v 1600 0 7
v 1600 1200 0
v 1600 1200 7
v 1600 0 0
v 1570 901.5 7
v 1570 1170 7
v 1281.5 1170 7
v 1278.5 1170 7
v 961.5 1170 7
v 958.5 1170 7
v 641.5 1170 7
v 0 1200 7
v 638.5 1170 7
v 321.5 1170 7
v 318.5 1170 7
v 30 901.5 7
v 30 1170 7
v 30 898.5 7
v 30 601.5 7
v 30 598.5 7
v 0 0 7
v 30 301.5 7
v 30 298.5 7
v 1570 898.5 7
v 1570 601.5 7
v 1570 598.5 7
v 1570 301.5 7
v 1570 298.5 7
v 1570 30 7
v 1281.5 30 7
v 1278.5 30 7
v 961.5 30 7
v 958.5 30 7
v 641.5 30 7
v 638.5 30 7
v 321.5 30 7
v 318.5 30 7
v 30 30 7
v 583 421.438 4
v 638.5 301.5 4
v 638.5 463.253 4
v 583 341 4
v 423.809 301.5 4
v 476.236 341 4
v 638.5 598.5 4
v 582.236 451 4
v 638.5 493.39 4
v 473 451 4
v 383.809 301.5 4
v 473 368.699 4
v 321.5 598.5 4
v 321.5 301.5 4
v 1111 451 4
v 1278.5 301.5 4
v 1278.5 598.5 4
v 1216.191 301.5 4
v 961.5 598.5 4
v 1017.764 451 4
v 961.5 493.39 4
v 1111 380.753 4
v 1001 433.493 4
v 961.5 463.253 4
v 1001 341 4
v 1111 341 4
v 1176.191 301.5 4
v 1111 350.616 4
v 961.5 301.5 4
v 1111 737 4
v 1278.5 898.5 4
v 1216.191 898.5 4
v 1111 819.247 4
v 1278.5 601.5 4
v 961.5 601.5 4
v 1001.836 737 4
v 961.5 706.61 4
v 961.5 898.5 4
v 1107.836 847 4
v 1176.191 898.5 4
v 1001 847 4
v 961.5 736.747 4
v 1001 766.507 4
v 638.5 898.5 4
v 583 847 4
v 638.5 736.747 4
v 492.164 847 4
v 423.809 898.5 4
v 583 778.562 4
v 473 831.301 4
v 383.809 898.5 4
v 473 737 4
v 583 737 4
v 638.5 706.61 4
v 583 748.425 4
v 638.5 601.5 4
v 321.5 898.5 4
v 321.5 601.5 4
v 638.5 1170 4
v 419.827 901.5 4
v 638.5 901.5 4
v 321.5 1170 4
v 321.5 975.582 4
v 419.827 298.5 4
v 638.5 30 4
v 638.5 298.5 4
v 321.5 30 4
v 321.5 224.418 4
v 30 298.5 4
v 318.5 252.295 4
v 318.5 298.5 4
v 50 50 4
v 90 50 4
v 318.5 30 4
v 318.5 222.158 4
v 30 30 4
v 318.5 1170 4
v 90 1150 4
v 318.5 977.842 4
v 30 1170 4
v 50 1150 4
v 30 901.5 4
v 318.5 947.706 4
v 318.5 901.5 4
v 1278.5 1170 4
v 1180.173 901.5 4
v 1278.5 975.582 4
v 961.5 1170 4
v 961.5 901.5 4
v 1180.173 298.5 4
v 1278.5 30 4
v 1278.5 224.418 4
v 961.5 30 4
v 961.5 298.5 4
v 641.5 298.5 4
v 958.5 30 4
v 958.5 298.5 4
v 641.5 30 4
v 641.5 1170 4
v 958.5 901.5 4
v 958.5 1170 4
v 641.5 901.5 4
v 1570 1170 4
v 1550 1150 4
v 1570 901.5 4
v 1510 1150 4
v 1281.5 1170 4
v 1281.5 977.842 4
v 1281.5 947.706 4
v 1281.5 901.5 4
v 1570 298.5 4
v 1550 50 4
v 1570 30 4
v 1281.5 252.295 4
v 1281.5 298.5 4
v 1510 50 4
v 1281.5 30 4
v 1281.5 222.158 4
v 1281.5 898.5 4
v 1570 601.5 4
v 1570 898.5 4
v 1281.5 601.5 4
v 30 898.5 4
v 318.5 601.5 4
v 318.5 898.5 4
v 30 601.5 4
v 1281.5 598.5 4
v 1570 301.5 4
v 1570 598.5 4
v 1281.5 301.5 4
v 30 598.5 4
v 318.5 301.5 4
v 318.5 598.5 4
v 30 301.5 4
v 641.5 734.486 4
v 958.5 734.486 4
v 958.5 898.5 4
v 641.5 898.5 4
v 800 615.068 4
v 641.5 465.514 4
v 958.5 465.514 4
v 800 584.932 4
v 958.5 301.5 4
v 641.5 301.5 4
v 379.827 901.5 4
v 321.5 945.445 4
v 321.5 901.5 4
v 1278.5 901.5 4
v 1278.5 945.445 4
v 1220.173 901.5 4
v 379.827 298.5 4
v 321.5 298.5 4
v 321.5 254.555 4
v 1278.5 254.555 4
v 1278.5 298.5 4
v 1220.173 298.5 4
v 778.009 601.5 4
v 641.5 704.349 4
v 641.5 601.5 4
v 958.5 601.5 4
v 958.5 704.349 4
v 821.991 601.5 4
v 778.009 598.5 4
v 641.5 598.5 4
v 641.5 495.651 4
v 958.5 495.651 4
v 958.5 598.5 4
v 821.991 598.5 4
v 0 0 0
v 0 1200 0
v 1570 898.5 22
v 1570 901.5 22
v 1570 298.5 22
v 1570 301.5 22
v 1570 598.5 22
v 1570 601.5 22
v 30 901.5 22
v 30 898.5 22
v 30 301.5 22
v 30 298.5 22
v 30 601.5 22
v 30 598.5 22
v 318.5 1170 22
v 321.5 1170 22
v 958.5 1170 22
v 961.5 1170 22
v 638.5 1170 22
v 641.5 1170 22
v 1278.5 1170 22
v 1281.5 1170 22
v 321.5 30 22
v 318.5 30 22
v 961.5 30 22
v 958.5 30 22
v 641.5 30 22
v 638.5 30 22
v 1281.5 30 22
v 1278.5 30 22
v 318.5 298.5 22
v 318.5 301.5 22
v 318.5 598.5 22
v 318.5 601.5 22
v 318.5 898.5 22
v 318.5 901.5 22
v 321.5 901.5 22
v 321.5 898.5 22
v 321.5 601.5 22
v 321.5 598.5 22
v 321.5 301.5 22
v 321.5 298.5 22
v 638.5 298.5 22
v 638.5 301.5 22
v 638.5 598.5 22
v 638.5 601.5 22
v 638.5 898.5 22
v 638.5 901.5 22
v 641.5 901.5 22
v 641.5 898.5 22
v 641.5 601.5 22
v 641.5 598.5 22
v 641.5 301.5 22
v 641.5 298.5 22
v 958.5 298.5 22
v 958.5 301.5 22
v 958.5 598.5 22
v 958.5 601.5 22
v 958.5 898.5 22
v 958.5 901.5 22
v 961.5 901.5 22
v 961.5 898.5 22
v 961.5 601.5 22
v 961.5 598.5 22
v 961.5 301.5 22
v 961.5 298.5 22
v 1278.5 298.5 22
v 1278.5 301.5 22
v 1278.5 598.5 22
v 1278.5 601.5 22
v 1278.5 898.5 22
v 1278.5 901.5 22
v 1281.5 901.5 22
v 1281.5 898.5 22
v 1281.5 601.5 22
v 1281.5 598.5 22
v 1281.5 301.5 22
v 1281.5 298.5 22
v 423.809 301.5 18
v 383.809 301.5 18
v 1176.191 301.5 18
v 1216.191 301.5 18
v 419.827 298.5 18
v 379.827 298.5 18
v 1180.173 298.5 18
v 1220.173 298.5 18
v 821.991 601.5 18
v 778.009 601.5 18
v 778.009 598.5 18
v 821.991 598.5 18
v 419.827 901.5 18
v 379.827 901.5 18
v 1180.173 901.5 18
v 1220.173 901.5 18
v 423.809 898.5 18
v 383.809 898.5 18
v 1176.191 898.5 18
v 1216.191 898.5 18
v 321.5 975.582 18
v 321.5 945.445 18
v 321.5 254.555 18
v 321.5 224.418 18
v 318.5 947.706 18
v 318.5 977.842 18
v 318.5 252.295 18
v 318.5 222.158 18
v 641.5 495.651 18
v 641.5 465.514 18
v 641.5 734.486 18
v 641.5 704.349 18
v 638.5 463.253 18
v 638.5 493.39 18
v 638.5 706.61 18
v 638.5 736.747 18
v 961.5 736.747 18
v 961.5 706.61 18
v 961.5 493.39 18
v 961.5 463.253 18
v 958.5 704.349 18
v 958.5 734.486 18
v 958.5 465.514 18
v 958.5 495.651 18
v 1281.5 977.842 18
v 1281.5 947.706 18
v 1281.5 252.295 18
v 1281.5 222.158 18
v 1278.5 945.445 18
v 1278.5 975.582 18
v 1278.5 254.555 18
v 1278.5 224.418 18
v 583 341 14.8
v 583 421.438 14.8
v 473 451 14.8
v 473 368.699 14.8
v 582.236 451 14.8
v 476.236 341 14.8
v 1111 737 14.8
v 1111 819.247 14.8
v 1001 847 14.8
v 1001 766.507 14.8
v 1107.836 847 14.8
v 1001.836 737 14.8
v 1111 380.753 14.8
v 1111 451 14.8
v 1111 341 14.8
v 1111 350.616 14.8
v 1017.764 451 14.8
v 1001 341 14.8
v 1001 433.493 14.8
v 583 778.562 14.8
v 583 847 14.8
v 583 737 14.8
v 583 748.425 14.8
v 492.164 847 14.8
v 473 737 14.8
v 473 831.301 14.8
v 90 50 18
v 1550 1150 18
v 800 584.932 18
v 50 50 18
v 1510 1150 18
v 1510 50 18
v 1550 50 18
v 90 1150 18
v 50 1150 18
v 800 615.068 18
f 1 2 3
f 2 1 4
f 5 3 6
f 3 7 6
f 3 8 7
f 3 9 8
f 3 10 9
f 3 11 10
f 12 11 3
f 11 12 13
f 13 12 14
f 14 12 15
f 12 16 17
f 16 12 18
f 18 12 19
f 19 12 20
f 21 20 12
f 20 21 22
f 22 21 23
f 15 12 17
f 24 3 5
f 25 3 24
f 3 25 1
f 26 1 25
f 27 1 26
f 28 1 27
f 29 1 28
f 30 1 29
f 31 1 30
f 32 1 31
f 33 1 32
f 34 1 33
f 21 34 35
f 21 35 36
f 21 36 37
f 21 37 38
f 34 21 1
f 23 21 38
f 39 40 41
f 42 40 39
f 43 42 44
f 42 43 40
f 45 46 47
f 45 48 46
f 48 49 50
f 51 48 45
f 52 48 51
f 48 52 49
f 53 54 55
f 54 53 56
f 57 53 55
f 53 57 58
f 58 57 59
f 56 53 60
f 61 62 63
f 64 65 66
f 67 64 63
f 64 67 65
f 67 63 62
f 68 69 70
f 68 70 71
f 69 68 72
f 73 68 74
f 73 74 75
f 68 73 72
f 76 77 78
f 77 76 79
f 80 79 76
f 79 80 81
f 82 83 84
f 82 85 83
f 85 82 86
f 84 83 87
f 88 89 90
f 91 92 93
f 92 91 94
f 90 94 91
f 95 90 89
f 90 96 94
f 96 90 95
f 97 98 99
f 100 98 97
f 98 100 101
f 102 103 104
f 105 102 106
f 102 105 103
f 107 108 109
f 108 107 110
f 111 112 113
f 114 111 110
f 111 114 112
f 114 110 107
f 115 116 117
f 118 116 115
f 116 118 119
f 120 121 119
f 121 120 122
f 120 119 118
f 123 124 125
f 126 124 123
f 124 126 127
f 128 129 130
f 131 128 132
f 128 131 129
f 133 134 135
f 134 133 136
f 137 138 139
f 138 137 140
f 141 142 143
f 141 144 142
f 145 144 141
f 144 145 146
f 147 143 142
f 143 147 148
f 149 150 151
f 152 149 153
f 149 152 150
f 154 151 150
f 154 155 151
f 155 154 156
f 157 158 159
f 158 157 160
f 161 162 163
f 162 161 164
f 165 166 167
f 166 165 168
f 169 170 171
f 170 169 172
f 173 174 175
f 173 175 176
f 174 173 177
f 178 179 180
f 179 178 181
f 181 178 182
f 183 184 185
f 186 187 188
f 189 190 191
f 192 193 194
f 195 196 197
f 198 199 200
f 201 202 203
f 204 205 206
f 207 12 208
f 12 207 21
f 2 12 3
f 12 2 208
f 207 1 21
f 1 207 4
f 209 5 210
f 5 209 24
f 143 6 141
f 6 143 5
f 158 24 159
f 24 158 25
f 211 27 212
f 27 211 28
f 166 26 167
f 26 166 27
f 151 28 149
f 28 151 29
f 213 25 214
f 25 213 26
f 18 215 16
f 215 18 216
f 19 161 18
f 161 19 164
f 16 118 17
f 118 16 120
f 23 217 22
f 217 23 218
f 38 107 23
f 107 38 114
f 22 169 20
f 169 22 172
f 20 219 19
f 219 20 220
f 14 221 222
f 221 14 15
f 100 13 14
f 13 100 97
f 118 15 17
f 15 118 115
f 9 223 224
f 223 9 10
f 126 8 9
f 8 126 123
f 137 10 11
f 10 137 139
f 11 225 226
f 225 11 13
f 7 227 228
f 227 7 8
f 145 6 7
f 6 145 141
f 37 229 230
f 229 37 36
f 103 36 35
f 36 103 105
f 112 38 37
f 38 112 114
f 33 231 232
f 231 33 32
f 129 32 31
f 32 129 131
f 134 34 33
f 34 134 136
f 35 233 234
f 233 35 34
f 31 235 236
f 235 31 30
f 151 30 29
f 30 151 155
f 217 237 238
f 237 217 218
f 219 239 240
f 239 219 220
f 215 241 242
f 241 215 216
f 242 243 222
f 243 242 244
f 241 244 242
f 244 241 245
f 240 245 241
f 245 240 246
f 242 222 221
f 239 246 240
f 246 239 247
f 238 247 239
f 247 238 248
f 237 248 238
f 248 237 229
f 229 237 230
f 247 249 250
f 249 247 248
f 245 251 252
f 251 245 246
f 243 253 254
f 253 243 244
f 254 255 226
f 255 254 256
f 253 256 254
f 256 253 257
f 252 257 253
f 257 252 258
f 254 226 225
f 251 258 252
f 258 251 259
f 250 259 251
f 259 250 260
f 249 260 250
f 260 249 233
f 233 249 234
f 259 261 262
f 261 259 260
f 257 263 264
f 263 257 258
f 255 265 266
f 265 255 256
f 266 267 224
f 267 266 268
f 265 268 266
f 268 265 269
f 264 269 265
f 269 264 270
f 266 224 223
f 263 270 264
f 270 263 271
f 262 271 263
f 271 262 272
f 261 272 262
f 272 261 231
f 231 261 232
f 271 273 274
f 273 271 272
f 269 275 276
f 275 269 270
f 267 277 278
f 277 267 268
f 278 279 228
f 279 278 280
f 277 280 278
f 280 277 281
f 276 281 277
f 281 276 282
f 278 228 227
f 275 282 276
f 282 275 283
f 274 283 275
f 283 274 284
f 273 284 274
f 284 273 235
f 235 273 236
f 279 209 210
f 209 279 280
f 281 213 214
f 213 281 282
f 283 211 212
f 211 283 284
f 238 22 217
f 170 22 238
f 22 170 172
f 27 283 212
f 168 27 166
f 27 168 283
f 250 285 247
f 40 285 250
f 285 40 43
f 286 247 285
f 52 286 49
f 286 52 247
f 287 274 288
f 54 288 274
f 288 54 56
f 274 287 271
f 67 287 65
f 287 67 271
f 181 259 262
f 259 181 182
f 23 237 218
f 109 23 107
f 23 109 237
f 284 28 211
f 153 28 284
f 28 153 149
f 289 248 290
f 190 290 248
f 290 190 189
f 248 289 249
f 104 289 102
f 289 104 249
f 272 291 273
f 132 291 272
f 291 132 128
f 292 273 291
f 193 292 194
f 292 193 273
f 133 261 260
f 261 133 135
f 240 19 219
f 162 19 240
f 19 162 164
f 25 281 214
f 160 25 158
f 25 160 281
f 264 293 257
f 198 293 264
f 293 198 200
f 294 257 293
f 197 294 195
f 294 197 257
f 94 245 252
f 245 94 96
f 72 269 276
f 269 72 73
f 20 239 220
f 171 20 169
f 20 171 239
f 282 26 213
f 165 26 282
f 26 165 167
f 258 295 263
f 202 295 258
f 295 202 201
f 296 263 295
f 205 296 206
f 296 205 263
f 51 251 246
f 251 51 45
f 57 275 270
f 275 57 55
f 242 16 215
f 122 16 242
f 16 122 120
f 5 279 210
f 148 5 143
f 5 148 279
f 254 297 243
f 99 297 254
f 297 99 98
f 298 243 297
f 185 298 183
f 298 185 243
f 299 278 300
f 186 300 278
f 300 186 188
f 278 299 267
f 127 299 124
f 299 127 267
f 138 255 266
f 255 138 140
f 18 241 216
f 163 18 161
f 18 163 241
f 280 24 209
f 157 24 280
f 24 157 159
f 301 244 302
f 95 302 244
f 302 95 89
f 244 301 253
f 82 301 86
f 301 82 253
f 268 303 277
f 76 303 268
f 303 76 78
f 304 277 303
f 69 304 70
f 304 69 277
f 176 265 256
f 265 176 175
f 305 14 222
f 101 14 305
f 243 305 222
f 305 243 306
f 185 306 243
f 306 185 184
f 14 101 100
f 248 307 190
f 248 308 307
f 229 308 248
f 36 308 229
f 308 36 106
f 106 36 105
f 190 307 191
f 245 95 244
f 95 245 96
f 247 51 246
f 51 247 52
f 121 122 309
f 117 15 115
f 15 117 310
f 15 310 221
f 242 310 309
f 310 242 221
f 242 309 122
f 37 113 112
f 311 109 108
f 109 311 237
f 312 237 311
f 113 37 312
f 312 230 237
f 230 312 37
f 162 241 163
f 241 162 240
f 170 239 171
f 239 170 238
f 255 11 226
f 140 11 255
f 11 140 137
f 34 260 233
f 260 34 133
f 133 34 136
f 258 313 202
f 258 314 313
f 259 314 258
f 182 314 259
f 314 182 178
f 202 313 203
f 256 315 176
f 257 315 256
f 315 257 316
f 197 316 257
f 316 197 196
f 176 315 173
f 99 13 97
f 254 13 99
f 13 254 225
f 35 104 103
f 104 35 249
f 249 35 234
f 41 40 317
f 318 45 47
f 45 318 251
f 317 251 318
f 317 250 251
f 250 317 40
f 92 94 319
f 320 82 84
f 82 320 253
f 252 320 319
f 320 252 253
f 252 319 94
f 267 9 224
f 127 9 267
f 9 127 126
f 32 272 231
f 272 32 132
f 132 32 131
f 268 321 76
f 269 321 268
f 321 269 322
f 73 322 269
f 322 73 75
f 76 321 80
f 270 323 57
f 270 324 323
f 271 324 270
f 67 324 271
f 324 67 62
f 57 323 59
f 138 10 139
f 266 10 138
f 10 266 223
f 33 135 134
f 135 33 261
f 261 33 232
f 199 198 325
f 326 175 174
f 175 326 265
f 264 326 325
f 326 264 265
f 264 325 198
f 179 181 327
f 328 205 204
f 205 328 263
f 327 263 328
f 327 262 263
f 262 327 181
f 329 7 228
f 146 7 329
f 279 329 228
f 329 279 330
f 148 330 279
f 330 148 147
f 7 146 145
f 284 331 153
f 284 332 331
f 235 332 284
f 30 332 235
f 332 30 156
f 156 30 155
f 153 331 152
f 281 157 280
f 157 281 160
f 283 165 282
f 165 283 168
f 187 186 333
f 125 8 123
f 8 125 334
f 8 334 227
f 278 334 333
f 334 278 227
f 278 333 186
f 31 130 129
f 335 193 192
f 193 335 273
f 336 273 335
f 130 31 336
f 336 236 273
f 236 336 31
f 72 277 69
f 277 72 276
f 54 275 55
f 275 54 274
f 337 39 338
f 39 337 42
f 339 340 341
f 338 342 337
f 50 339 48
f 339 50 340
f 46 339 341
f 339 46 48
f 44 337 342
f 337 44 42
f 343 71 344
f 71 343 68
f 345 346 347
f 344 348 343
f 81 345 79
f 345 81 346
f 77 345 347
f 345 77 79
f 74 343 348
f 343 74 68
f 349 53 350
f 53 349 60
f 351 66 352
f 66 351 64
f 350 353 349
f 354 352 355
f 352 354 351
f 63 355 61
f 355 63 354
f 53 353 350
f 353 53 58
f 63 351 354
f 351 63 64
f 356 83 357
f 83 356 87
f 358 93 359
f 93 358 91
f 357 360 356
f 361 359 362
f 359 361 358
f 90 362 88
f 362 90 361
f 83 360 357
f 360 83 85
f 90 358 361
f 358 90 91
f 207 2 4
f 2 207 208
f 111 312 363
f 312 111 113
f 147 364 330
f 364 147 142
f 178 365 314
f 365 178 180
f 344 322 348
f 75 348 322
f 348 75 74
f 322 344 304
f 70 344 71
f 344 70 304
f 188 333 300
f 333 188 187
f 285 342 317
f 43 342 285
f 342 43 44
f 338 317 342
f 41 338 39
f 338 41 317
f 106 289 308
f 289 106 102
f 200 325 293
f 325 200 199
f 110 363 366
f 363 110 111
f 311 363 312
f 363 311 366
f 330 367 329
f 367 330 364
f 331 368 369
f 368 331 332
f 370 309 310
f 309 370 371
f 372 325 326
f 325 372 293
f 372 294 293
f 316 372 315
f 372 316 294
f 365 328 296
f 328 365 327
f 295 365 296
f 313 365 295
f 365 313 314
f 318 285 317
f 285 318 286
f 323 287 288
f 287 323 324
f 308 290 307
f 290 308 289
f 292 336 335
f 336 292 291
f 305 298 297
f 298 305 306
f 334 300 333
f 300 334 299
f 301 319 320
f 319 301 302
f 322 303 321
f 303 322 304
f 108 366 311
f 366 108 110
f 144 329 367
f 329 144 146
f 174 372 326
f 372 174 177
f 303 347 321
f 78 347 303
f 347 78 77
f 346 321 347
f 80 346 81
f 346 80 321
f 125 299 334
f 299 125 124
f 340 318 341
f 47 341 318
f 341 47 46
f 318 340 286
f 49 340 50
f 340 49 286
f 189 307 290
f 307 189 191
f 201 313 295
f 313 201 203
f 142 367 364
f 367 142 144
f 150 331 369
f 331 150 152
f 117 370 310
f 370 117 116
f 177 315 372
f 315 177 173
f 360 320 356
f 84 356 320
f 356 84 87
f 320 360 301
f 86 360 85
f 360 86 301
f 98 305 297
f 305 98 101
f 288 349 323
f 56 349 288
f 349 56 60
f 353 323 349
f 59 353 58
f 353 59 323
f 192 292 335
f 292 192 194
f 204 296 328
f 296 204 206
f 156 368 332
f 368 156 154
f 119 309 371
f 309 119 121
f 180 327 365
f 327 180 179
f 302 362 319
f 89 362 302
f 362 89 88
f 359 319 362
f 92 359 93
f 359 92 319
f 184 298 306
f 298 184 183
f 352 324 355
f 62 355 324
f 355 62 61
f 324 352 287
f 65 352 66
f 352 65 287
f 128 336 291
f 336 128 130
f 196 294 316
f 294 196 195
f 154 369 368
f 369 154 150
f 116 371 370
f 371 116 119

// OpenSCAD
// file: battery_baseplate.scad
// 电池包底板独立建模 + 拓扑优化后结构重建
// 单位: mm

$fn = 64;

// ---------- 全局参数 ----------
L = 1600;          // 长
W = 1200;          // 宽
T = 4;             // 初始底板厚度
BORDER = 30;       // 边框保留带
RIB_H = 18;        // 加强筋高度
RIB_T = 3;         // 加强筋厚度
MOUNT_D = 16;      // 安装孔孔径

module raw_baseplate(){
  difference(){
    cube([L, W, T], center = false);

    // 安装孔（示例：四角 + 中部）
    for (p = [
      [80,80], [L-80,80], [80,W-80], [L-80,W-80],
      [L/2,120], [L/2,W-120], [120,W/2], [L-120,W/2]
    ]) {
      translate([p[0], p[1], -1]) cylinder(h = T+2, d = MOUNT_D);
    }
  }
}

// 以“拓扑优化结果”重建：
// 1) 边界连续承载环
// 2) 沿主应力路径的 X 向/十字向筋
// 3) 局部载荷区保留实体岛
module optimized_baseplate(){
  union(){
    // 薄板底层
    cube([L, W, T], center = false);

    // 边框承载带
    difference(){
      translate([0,0,T]) cube([L, W, RIB_T], center = false);
      translate([BORDER, BORDER, T-0.5]) cube([L-2*BORDER, W-2*BORDER, RIB_T+1], center = false);
    }

    // X 向主筋（工况：纵向冲击/弯曲）
    linear_extrude(height = RIB_H)
      polygon(points = [
        [BORDER+20, BORDER+20],
        [BORDER+60, BORDER+20],
        [L-BORDER-20, W-BORDER-20],
        [L-BORDER-60, W-BORDER-20]
      ]);

    linear_extrude(height = RIB_H)
      polygon(points = [
        [L-BORDER-20, BORDER+20],
        [L-BORDER-60, BORDER+20],
        [BORDER+20, W-BORDER-20],
        [BORDER+60, W-BORDER-20]
      ]);

    // 横向筋（工况：托底/石击引起局部弯曲）
    for (y = [W*0.25, W*0.5, W*0.75]){
      translate([BORDER, y-RIB_T/2, T]) cube([L-2*BORDER, RIB_T, RIB_H], center = false);
    }

    // 纵向筋（工况：电池模组质量引起跨距挠度）
    for (x = [L*0.2, L*0.4, L*0.6, L*0.8]){
      translate([x-RIB_T/2, BORDER, T]) cube([RIB_T, W-2*BORDER, RIB_H], center = false);
    }

    // 局部载荷实体岛（千斤顶/吊装/碰撞热点）
    for (p = [[L*0.33, W*0.33], [L*0.66, W*0.66], [L*0.66, W*0.33], [L*0.33, W*0.66]]) {
      translate([p[0]-55, p[1]-55, T]) cube([110, 110, RIB_H*0.6], center = false);
    }
  }

  // 重新打孔
  difference(){
    children();
    for (p = [
      [80,80], [L-80,80], [80,W-80], [L-80,W-80],
      [L/2,120], [L/2,W-120], [120,W/2], [L-120,W/2]
    ]) {
      translate([p[0], p[1], -1]) cylinder(h = T+RIB_H+5, d = MOUNT_D);
    }
  }
}

// 切换显示：
// raw_baseplate();
optimized_baseplate();
// main file
// 单独输出：拓扑优化后的底板
use <battery_baseplate.scad>
optimized_baseplate();
